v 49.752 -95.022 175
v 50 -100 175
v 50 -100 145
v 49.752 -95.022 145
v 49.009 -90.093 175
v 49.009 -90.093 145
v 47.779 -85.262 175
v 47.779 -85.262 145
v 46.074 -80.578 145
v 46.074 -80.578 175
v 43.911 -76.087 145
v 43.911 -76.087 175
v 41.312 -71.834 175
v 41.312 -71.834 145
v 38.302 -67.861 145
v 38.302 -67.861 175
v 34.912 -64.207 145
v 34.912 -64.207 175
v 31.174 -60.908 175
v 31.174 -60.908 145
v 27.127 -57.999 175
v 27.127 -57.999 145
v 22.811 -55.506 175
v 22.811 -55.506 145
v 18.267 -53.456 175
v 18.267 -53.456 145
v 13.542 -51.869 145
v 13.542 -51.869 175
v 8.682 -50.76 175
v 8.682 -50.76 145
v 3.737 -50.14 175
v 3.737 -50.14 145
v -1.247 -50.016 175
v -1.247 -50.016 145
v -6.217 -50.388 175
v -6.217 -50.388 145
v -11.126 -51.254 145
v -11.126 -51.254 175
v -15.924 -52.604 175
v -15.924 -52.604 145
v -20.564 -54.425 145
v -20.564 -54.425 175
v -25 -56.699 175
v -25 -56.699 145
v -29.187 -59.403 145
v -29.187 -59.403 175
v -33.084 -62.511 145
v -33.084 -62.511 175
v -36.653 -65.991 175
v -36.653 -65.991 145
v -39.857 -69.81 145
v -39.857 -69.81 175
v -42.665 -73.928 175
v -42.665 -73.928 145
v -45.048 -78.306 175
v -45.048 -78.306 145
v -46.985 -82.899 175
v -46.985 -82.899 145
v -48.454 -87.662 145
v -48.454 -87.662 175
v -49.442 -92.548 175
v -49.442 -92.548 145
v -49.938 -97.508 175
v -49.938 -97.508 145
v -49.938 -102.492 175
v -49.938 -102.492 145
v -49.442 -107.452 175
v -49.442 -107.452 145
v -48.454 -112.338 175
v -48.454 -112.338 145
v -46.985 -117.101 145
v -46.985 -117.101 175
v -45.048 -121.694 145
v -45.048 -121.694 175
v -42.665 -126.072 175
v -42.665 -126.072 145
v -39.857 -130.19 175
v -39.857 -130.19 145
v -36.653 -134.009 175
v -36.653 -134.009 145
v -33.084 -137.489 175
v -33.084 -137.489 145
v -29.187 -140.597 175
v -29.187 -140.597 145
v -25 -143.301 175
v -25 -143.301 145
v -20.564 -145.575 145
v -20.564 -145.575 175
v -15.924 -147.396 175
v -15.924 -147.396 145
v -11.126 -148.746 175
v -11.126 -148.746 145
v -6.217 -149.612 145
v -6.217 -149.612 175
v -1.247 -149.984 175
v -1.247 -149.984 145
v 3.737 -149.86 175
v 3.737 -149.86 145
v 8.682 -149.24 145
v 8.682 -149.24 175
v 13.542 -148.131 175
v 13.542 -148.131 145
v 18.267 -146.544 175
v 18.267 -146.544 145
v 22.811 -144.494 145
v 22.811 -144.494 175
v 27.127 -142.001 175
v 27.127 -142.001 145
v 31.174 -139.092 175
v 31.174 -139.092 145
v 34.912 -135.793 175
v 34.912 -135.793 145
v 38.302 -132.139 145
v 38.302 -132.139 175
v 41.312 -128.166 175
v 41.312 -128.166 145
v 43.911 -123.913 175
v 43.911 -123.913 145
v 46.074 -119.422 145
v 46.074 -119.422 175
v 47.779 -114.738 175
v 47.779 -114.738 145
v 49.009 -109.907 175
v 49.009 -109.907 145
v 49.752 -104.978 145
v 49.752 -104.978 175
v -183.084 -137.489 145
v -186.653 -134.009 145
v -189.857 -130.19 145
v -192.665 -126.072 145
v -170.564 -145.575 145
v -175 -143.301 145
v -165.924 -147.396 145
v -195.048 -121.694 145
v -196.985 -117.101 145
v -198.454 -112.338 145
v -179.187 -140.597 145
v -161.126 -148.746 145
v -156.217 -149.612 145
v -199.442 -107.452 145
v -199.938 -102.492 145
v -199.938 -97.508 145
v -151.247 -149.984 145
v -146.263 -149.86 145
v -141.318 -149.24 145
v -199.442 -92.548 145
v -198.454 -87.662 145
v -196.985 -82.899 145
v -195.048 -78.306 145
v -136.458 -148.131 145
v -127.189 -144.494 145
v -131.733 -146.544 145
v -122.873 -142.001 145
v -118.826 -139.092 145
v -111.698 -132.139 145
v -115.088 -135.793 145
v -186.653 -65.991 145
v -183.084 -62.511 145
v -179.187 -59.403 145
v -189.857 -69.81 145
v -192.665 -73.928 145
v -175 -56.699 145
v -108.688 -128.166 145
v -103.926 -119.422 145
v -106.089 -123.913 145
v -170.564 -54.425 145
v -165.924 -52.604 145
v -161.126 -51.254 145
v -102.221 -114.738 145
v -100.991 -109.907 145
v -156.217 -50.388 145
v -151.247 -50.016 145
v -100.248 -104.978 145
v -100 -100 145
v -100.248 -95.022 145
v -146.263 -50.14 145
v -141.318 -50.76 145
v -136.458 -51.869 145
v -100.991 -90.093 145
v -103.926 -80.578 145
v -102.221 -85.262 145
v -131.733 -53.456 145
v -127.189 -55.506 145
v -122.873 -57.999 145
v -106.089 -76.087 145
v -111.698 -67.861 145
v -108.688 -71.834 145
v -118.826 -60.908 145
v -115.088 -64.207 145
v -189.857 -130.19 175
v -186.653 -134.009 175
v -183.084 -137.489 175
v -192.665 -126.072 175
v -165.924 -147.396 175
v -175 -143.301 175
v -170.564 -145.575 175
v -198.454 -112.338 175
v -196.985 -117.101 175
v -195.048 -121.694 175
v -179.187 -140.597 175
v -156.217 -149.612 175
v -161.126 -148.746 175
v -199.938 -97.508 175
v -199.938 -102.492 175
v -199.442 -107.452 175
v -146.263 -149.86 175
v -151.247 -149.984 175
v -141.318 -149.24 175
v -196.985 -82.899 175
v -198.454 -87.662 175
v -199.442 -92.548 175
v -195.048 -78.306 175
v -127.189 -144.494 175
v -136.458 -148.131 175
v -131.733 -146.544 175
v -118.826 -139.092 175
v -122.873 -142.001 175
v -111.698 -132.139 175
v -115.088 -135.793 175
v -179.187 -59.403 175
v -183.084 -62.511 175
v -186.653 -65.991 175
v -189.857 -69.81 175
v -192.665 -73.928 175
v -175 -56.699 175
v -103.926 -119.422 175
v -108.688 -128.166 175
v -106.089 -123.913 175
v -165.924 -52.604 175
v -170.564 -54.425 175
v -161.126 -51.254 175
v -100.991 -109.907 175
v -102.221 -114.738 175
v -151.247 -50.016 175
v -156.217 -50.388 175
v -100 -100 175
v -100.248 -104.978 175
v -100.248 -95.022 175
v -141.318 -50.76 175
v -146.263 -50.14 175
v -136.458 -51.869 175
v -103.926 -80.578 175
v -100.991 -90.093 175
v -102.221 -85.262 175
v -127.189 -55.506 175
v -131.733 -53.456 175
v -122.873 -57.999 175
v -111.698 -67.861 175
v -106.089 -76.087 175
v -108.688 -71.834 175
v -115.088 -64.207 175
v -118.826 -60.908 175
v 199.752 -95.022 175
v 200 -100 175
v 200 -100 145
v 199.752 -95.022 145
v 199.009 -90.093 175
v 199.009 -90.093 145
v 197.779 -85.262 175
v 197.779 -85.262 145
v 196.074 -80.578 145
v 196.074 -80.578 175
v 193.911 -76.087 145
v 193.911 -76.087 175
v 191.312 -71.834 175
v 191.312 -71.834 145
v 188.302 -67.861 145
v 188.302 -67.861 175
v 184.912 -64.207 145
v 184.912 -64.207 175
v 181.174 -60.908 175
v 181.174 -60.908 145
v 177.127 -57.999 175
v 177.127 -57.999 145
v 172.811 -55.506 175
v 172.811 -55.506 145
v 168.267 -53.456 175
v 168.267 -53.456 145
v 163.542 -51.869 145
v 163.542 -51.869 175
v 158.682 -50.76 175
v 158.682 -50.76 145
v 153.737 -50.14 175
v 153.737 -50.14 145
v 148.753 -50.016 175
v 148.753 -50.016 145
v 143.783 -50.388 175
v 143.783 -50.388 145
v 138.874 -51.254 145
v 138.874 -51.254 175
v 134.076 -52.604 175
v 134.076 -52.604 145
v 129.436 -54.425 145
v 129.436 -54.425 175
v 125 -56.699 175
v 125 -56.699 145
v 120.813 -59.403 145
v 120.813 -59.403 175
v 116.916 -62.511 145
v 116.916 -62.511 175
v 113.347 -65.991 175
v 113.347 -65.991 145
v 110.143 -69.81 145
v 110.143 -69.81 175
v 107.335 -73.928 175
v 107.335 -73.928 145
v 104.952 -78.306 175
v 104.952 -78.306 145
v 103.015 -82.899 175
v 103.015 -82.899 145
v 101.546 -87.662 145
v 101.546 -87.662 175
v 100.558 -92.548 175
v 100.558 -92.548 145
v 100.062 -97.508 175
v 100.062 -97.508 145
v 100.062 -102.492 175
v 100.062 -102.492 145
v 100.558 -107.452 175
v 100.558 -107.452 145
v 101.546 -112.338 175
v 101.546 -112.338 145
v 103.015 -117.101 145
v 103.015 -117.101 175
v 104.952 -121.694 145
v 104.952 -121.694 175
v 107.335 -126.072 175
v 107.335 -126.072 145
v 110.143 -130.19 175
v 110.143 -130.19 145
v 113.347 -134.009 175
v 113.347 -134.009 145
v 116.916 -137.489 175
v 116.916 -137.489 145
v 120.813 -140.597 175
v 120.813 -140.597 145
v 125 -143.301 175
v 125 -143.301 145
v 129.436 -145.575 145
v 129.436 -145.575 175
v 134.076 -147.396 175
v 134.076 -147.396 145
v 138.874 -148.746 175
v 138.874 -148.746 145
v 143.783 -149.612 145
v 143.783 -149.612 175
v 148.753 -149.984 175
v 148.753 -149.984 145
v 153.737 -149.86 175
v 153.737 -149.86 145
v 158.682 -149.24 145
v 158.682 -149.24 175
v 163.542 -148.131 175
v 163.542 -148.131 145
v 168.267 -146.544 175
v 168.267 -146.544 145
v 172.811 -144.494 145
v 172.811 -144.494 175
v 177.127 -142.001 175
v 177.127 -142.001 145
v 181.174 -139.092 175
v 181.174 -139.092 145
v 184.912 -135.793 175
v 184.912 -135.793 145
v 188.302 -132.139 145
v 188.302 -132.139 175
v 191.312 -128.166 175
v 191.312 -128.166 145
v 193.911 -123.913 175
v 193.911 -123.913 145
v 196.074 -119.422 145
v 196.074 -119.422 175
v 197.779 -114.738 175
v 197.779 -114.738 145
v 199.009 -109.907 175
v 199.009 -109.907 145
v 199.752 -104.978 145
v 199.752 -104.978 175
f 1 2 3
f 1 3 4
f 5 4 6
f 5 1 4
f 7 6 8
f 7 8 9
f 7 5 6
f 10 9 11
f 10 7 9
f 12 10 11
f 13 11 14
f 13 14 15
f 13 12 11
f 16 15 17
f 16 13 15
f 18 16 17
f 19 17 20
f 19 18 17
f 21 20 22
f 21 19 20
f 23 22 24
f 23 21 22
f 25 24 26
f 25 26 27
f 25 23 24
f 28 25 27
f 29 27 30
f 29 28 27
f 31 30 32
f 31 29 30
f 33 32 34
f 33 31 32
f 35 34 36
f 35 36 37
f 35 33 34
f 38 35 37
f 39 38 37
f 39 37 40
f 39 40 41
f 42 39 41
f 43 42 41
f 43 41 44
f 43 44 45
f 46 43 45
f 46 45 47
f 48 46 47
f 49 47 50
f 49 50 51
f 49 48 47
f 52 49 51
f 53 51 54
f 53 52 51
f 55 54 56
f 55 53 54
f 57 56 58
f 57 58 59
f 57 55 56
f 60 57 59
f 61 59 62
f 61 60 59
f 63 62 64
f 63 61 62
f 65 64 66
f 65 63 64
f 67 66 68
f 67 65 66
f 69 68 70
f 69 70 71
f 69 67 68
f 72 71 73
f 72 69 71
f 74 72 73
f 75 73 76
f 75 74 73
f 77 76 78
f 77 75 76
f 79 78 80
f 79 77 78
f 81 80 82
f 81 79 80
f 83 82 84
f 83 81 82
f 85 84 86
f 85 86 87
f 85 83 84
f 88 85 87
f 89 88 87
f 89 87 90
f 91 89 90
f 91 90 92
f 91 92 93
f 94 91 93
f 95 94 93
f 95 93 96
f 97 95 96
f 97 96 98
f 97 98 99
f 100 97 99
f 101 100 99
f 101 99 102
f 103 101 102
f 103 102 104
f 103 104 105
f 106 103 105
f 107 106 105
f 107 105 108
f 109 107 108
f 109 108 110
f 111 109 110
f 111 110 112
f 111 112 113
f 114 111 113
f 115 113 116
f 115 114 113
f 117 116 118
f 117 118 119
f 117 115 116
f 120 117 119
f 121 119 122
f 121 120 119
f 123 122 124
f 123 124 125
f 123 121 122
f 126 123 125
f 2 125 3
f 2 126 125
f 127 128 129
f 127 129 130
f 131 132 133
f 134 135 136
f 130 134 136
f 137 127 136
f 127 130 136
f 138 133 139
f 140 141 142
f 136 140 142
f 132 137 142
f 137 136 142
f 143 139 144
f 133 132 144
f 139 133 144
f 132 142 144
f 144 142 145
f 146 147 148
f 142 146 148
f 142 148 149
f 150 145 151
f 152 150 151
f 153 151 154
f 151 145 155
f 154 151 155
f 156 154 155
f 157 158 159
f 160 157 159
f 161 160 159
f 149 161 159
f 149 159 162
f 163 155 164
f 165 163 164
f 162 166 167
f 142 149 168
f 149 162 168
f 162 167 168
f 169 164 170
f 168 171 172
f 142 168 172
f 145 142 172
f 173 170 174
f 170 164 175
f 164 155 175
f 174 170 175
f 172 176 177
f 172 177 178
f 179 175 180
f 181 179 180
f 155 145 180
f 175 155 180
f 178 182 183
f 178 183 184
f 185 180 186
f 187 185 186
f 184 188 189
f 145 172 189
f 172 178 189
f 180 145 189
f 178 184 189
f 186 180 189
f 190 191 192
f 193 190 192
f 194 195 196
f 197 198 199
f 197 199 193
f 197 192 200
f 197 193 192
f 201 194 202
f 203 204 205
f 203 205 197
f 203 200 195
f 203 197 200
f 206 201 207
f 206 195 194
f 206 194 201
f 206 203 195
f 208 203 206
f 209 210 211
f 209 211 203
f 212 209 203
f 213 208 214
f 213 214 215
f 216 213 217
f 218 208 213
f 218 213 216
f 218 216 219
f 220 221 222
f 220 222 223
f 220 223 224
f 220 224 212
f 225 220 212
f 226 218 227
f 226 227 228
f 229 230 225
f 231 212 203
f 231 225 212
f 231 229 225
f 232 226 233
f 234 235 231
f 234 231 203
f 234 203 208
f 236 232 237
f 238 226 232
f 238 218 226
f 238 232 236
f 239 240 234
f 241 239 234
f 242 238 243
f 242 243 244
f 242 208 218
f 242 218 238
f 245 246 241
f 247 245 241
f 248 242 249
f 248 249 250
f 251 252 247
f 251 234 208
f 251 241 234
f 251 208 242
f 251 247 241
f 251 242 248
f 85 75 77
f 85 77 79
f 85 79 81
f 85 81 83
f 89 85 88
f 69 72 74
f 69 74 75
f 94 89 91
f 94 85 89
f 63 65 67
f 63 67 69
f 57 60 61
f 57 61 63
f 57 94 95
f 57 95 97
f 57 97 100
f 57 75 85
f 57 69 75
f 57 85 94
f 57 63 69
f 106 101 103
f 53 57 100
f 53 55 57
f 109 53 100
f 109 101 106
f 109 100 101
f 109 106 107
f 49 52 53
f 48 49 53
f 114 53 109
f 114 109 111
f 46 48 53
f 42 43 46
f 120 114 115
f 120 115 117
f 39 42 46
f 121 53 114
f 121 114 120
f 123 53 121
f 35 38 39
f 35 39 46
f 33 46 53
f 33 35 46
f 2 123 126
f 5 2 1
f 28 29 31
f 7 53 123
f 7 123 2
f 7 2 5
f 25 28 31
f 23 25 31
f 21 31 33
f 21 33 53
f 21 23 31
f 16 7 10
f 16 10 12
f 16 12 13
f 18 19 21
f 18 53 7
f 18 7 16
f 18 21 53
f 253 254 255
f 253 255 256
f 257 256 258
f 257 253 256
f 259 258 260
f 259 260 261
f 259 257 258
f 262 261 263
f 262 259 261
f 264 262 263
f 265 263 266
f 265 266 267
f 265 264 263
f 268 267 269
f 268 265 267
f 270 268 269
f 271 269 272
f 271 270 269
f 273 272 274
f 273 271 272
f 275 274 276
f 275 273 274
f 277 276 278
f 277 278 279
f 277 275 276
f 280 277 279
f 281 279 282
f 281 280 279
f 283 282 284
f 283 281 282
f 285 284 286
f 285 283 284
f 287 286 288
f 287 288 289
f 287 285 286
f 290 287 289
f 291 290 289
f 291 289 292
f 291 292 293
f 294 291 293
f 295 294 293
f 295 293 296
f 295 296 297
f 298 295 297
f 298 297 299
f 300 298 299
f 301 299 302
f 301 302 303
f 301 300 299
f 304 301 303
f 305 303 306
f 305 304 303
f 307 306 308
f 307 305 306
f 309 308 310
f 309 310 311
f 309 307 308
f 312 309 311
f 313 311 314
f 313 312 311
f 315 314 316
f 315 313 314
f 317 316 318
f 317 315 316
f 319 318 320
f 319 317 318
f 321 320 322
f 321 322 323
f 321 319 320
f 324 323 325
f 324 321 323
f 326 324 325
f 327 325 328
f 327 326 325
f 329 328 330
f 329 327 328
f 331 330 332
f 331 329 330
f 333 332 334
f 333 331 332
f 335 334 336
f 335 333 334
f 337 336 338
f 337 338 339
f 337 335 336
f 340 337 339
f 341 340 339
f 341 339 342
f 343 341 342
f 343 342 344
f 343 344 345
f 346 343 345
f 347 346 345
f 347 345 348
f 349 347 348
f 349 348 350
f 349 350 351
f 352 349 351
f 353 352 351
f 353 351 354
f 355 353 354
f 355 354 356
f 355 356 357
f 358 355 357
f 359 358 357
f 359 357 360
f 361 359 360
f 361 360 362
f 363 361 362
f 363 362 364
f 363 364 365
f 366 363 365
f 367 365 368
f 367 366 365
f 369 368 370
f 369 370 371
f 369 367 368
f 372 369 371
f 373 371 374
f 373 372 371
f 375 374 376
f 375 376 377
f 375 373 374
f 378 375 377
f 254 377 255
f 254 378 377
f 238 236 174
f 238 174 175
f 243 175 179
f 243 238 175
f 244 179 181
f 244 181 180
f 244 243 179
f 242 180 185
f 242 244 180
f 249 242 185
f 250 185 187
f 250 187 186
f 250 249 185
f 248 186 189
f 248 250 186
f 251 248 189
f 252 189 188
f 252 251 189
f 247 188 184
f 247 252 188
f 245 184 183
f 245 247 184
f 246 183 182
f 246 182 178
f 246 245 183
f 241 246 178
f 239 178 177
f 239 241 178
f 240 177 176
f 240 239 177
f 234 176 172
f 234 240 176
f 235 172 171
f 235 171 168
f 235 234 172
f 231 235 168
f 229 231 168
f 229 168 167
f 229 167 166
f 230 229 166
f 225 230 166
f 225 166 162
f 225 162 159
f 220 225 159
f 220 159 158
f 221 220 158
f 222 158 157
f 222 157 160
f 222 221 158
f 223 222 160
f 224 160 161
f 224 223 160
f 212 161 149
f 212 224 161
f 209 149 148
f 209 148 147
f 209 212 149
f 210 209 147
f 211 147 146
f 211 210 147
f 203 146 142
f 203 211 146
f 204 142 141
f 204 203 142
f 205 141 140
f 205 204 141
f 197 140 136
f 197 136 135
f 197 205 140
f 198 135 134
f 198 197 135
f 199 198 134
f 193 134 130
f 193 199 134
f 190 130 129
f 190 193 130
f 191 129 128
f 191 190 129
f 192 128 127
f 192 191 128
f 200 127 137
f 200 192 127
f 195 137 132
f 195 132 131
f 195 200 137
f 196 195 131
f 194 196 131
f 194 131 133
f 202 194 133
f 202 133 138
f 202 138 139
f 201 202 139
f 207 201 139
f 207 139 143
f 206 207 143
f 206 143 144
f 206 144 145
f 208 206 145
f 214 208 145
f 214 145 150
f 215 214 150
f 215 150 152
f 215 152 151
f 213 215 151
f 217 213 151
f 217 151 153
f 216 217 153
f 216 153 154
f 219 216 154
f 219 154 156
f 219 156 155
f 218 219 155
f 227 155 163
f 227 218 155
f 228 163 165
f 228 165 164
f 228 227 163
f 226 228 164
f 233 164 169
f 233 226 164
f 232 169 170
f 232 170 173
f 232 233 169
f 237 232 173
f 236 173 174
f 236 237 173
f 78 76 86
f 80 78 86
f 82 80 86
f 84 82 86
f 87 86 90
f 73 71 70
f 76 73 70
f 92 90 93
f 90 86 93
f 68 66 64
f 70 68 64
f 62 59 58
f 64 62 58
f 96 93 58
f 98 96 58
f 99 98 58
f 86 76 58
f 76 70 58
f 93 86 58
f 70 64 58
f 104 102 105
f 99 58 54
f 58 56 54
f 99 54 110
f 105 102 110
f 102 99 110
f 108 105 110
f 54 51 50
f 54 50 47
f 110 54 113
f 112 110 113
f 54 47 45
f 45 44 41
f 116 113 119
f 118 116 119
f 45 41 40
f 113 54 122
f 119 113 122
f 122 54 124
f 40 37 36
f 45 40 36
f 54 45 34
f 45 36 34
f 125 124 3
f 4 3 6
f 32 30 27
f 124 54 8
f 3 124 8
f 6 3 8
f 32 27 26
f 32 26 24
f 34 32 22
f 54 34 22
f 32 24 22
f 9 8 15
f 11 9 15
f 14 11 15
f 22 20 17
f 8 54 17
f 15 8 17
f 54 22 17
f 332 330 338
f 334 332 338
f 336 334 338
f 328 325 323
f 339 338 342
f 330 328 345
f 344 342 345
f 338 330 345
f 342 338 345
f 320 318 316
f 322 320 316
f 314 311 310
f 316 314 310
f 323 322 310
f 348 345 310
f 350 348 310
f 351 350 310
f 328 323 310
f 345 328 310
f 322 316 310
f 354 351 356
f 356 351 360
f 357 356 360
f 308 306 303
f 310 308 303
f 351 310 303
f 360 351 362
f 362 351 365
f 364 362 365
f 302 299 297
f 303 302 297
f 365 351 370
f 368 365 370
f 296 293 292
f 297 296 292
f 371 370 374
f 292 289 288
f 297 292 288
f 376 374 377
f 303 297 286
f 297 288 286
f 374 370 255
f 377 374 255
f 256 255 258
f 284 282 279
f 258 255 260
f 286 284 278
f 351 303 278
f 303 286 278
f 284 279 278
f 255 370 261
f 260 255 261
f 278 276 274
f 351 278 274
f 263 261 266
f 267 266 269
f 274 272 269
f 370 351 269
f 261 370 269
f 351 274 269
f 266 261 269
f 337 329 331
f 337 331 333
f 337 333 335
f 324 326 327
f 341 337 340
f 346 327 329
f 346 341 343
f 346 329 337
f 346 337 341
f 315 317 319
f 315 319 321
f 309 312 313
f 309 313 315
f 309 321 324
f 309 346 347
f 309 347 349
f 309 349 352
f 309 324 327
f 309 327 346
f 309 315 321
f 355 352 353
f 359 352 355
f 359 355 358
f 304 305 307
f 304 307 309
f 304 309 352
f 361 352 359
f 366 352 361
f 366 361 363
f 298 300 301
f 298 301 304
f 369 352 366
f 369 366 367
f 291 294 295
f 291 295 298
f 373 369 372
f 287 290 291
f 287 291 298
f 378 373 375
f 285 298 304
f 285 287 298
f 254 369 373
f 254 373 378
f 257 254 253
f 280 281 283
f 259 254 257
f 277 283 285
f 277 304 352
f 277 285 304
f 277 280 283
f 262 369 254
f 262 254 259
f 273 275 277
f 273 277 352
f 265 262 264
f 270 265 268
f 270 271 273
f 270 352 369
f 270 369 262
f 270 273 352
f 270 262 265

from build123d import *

# Parameters (mm, degrees)
SKETCH3_R             = 50
BOSS_EXTRUDE1_DEPTH   = 30
BOSS_EXTRUDE1_2_DEPTH = 30
BOSS_EXTRUDE1_3_DEPTH = 30


with BuildPart() as part:
    # Sketch3 → Boss-Extrude1 (new body)
    with BuildSketch(Plane.XY.offset(175)):
        with Locations((150, -100)):
            Circle(SKETCH3_R)
    extrude(amount=-BOSS_EXTRUDE1_DEPTH)


with BuildPart() as body_2:
    # Sketch3 → Boss-Extrude1 2 (new body)
    with BuildSketch(Plane.XY.offset(175)):
        with Locations((0, -100)):
            Circle(SKETCH3_R)
    extrude(amount=-BOSS_EXTRUDE1_2_DEPTH)


with BuildPart() as body_3:
    # Sketch3 → Boss-Extrude1 3 (new body)
    with BuildSketch(Plane.XY.offset(175)):
        with Locations((-150, -100)):
            Circle(SKETCH3_R)
    extrude(amount=-BOSS_EXTRUDE1_3_DEPTH)


solid = Compound([part.part, body_2.part, body_3.part])
